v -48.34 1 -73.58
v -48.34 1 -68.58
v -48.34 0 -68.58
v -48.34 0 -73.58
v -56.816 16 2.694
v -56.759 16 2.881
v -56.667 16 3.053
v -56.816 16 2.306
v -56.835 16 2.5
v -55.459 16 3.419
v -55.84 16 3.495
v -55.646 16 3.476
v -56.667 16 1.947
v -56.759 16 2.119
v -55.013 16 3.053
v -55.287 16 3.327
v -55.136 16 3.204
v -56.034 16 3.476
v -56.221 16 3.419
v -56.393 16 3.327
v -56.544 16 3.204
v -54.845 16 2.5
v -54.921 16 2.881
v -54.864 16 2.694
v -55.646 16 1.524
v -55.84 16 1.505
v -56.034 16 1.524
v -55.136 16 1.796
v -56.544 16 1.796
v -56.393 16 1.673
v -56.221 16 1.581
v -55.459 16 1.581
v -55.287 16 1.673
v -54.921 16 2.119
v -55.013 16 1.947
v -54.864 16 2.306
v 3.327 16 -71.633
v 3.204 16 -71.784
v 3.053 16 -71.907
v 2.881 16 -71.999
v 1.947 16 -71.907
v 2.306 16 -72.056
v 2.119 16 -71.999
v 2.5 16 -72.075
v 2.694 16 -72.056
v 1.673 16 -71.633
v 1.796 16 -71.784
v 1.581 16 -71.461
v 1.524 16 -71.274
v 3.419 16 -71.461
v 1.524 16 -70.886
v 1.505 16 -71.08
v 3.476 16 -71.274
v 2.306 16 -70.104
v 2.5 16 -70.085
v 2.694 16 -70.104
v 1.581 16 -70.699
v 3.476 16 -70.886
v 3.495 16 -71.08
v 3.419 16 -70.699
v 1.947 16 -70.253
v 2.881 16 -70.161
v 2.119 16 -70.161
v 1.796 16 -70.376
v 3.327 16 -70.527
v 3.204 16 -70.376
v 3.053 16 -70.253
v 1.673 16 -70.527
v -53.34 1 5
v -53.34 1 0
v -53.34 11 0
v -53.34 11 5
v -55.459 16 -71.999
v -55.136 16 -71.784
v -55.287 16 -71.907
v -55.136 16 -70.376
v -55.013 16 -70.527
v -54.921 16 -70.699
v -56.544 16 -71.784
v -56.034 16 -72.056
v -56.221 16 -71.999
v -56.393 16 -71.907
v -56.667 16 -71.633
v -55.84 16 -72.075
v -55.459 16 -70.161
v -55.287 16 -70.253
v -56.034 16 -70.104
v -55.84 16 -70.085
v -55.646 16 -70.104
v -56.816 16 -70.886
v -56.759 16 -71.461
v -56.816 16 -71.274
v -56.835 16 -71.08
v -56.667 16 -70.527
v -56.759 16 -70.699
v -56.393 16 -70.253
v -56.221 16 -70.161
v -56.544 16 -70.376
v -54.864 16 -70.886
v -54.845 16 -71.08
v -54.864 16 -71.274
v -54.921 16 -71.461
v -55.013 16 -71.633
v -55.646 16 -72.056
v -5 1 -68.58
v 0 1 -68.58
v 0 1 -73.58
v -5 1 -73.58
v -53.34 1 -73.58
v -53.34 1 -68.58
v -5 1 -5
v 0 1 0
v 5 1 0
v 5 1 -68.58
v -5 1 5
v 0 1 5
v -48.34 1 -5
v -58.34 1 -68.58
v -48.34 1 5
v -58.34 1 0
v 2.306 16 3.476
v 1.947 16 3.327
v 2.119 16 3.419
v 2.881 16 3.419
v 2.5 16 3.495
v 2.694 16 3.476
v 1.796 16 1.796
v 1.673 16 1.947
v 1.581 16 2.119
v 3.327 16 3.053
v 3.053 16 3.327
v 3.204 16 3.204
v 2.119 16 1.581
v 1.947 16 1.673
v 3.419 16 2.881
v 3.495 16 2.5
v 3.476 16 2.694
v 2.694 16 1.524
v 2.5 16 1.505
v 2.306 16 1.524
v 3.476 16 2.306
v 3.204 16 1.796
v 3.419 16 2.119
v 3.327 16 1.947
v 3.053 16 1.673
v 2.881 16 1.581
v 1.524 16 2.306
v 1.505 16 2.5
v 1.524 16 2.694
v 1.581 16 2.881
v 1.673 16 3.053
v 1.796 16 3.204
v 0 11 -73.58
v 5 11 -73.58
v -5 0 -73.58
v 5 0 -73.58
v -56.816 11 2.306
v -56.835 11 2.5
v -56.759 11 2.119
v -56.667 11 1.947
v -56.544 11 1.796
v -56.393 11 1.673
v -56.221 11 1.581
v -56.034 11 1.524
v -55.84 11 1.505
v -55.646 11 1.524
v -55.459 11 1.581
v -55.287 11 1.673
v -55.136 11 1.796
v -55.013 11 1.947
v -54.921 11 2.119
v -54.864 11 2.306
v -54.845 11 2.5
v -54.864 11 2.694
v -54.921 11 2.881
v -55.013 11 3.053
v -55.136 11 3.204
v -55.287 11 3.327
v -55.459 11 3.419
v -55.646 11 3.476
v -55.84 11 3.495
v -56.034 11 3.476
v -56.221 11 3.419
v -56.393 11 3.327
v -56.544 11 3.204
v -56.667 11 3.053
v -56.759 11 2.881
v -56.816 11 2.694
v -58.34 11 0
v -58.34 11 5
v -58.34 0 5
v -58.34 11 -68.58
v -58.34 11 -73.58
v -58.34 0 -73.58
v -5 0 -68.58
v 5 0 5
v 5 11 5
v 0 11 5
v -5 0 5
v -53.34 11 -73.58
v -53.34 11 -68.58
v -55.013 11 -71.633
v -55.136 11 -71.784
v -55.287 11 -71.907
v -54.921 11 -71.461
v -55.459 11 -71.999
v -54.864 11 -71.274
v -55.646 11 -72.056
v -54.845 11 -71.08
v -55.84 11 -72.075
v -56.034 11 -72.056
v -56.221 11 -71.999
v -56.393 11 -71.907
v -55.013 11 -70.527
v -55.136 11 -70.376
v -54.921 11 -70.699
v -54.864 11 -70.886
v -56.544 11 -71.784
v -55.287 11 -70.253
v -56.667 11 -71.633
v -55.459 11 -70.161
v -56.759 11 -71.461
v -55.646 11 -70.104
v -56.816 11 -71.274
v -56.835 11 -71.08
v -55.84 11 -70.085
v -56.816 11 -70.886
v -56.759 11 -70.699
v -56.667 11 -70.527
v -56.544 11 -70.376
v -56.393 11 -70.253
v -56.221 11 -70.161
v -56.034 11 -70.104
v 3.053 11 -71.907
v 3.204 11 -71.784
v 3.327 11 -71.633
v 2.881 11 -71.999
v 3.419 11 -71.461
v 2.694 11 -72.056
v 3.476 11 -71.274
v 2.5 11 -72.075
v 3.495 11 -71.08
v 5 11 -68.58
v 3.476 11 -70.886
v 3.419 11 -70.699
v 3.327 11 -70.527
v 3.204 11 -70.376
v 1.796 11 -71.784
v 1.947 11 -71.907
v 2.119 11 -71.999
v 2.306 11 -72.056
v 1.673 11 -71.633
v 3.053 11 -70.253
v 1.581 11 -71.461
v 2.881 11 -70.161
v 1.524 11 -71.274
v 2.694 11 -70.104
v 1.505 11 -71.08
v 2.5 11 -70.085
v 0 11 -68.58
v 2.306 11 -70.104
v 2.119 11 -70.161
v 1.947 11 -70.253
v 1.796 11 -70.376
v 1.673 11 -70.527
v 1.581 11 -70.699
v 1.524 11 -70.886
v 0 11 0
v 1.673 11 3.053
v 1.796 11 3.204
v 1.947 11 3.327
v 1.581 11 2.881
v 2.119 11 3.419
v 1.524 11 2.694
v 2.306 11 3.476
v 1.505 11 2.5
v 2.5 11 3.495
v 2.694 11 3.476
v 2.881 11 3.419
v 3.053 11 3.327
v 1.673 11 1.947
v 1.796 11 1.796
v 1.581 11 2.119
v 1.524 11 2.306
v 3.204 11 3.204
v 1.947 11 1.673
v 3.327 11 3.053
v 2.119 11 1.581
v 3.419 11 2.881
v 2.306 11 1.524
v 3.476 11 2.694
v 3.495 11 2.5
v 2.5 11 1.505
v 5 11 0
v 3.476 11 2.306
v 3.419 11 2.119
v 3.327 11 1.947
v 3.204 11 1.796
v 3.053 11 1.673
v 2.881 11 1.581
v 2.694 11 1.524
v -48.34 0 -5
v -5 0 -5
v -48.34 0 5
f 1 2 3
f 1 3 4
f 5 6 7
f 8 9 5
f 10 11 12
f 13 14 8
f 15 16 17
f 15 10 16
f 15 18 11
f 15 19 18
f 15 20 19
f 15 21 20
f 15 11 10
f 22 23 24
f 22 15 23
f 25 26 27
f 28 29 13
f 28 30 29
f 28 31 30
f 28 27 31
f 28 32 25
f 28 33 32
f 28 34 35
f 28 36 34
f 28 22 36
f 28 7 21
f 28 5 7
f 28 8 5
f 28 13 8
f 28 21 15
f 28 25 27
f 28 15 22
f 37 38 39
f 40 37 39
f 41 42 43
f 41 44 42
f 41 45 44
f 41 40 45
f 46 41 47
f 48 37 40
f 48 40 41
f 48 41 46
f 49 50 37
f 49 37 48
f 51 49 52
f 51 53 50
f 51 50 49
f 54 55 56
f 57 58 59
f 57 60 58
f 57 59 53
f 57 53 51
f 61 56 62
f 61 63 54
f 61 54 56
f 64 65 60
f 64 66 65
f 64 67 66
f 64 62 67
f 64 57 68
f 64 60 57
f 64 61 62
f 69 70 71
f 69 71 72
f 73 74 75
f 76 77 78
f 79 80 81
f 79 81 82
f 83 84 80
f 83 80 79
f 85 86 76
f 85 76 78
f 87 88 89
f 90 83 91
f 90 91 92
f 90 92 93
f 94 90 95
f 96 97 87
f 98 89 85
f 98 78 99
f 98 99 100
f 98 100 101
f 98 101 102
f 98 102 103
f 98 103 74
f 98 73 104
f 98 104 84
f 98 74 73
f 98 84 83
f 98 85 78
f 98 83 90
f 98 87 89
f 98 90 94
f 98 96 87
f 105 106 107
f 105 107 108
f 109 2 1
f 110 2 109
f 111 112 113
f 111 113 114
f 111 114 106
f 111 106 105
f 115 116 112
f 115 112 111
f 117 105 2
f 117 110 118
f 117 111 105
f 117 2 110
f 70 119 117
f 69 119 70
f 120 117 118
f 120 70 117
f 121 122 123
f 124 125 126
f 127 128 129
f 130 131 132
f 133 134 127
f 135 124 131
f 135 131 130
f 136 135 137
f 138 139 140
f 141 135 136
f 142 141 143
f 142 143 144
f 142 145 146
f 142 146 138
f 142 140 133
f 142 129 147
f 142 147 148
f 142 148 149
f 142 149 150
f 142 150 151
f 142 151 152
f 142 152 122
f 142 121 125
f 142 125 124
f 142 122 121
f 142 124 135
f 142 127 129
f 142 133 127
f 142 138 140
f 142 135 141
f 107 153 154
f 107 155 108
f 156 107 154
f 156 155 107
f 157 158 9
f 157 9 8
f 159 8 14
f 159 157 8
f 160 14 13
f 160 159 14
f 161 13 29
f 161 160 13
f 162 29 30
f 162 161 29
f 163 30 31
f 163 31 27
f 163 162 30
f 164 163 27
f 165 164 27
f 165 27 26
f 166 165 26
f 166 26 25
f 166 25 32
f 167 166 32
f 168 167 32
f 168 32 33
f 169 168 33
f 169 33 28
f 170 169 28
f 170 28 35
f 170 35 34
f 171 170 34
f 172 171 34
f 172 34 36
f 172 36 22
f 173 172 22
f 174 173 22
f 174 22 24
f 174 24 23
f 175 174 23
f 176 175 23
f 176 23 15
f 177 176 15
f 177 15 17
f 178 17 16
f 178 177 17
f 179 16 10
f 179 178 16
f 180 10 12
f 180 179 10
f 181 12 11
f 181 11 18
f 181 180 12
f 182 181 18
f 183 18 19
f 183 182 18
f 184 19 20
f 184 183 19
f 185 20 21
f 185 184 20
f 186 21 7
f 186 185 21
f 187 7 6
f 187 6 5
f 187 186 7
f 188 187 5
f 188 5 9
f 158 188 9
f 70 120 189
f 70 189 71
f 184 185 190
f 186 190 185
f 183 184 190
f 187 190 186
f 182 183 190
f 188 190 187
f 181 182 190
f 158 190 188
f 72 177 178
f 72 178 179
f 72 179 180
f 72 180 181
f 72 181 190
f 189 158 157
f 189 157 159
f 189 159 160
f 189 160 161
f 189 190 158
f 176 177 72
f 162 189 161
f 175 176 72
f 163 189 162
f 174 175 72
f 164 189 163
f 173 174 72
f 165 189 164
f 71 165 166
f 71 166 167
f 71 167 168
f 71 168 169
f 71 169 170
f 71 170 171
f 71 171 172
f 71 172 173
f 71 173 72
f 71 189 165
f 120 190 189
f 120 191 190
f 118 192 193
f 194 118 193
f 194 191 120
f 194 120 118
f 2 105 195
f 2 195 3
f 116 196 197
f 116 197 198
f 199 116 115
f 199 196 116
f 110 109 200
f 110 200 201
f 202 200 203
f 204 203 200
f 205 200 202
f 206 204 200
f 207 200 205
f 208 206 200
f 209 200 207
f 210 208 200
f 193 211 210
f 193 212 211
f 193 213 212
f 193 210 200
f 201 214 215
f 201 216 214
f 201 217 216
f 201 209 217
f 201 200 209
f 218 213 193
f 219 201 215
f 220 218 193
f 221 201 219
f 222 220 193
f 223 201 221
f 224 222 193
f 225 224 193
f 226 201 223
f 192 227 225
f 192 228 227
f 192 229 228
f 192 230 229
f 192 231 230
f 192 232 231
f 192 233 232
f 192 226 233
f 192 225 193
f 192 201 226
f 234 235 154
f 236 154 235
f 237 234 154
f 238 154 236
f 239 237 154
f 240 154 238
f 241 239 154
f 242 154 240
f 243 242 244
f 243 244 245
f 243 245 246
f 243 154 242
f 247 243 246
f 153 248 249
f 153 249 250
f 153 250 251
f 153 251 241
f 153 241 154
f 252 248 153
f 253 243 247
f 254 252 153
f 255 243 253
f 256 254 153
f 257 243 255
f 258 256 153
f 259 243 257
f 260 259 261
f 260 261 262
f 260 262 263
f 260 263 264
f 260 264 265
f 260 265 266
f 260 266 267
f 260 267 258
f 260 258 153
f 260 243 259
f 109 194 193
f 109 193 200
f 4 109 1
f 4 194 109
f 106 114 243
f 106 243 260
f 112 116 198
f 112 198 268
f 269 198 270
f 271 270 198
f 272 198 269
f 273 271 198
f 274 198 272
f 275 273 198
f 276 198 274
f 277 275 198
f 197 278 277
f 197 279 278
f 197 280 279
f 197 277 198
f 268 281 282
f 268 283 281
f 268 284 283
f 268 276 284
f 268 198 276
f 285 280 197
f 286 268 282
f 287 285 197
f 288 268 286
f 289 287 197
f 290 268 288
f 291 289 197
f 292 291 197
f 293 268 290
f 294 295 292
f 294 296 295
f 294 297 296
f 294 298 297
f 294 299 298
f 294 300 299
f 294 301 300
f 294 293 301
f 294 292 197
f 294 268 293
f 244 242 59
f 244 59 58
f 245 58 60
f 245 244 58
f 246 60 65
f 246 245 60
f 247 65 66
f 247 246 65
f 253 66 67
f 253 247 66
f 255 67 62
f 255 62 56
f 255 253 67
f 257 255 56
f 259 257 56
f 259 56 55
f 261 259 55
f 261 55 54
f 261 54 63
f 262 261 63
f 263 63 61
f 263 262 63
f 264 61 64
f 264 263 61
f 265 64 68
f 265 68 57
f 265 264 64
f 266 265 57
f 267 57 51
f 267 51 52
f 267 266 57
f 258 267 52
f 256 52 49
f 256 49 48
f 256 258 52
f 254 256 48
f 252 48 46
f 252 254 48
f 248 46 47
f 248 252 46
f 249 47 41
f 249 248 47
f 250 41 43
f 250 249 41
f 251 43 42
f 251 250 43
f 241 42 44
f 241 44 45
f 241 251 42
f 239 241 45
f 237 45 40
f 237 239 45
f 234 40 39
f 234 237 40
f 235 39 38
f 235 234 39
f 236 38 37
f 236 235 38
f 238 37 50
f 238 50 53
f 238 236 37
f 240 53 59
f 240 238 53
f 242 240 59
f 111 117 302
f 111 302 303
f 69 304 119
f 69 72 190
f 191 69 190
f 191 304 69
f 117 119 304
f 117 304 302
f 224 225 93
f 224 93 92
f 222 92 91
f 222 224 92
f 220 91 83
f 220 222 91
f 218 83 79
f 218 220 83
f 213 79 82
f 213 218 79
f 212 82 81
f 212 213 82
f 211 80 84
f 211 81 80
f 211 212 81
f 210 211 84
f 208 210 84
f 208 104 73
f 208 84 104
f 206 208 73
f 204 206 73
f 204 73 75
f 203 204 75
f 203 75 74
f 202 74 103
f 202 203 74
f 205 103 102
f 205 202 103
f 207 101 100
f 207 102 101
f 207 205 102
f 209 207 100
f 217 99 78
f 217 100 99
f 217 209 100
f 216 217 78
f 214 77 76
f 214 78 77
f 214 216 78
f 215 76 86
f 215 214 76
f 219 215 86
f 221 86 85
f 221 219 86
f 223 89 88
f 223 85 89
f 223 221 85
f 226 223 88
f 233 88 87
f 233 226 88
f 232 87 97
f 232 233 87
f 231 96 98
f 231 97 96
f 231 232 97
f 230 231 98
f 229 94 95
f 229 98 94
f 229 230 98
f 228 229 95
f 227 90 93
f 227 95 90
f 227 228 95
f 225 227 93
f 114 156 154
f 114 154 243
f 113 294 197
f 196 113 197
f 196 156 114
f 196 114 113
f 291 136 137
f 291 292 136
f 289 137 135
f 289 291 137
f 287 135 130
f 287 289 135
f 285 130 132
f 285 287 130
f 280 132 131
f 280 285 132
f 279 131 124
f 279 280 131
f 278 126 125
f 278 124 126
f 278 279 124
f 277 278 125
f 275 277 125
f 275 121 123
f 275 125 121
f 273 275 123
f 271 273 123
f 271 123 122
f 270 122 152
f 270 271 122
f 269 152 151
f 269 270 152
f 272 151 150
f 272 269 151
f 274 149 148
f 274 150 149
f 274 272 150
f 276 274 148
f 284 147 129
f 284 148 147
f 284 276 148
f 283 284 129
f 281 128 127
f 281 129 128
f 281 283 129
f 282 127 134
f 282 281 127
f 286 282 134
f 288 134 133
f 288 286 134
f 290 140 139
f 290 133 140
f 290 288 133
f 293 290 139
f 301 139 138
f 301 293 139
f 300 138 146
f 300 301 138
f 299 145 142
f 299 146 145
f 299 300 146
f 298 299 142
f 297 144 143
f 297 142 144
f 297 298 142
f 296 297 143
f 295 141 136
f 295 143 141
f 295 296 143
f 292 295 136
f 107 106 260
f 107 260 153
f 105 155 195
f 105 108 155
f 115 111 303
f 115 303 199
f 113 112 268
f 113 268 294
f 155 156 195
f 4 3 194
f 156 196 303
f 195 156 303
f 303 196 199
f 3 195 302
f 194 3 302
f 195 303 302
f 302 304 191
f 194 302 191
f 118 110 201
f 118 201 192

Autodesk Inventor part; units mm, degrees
ref_plane "YZ Plane" through (0, 0, 0) normal (1, 0, 0) x (0, 1, 0)
ref_plane "XZ Plane" through (0, 0, 0) normal (0, 1, 0) x (-1, 0, 0)
ref_plane "XY Plane" through (0, 0, 0) normal (0, 0, 1) x (1, 0, 0)
sketch "Sketch1" plane through (0, 0, 0) normal (0, 1, 0) x (-1, 0, 0)
  line L0 (0, 0) -> (53.34, 0)
  line L1 (53.34, 0) -> (53.34, -68.58)
  line L2 (53.34, -68.58) -> (0, -68.58)
  line L3 (0, -68.58) -> (0, 0)
  line L4 (53.34, -66) -> (0, -66) construction
  circle A0 centre (7.62, -66) radius 1.5
  circle A1 centre (35.56, -66) radius 1.5
  circle A2 centre (2.5, -14) radius 1.5
  line L5 (-5, -73.58) -> (58.34, -73.58)
  line L6 (58.34, -73.58) -> (58.34, 5)
  line L7 (58.34, 5) -> (-5, 5)
  line L8 (-5, 5) -> (-5, -73.58)
  dimension "d0" = 68.58
  dimension "d1" = 53.34
  dimension "d2" = 2.58
  dimension "d3" = 3
  dimension "d4" = 7.62
  dimension "d5" = 3
  dimension "d6" = 35.56
  dimension "d8" = 3
  dimension "d9" = 14
  dimension "d10" = 2.5
  dimension "d46" = 5
extrude "Extrusion4" add sketch "Sketch1" along normal blind 1 contours L0 L1 L2 L3 | A0 | A1 | A2 | L8 L7 L6 L5
sketch "Sketch5" plane through (0, 1, 0) normal (0, 1, 0) x (1, 0, 0)
  line L0 (5, -5) -> (0, -5)
  line L1 (0, -5) -> (0, 0)
  line L2 (0, 0) -> (5, 0)
  line L3 (5, 0) -> (5, -5)
  dimension "d49" = 5
  dimension "d50" = 5
extrude "Extrusion5" add sketch "Sketch5" along normal blind 10
ref_plane "Work Plane2" through (-26.67, 0, 5) normal (1, 0, 0) x (0, 0, -1)
mirror "Mirror2" about plane through (-26.67, 0, 5) normal (1, 0, 0) of "Extrusion5"
ref_plane "Work Plane3" through (-58.34, 0, -34.29) normal (0, 0, 1) x (1, 0, 0)
mirror "Mirror3" about plane through (-58.34, 0, -34.29) normal (0, 0, 1) of "Extrusion5", "Mirror2"
sketch "Sketch7" plane through (0, 11, 0) normal (0, 1, 0) x (1, 0, 0)
  line L0 (0, 0) -> (0, -5) projected
  line L1 (0, -5) -> (5, -5) projected
  line L2 (5, -5) -> (5, 0) projected
  line L3 (5, 0) -> (0, 0) projected
  circle A0 centre (2.5, -2.5) radius 0.995
  dimension "d53" = 5
  dimension "d54" = 1.99
extrude "Extrusion8" add sketch "Sketch7" along normal blind 5 contours A0
mirror "Mirror10" about plane through (-26.67, 0, 5) normal (1, 0, 0) of "Extrusion8"
mirror "Mirror11" about plane through (-58.34, 0, -34.29) normal (0, 0, 1) of "Extrusion8", "Mirror10"
sketch "Sketch8" plane through (0, 1, 0) normal (0, 1, 0) x (1, 0, 0)
  line L0 (-53.34, 73.58) -> (-53.34, 68.58) projected
  line L1 (-53.34, 68.58) -> (-58.34, 68.58) projected
  line L2 (-58.34, 68.58) -> (-58.34, 0) projected
  line L3 (-58.34, 0) -> (-53.34, 0) projected
  line L4 (-53.34, 0) -> (-53.34, -5) projected
  line L5 (-53.34, -5) -> (0, -5) projected
  line L6 (0, -5) -> (0, 0) projected
  line L7 (0, 0) -> (5, 0) projected
  line L8 (5, 0) -> (5, 68.58) projected
  line L9 (5, 68.58) -> (0, 68.58) projected
  line L10 (0, 68.58) -> (0, 73.58) projected
  line L11 (0, 73.58) -> (-53.34, 73.58) projected
  line L12 (-58.34, -5) -> (5, -5) projected
  line L13 (-48.34, 5) -> (-5, 5)
  line L14 (-5, 5) -> (-5, -5)
  line L15 (-5, -5) -> (-48.34, -5)
  line L16 (-48.34, -5) -> (-48.34, 5)
  line L17 (5, -5) -> (5, 73.58) projected
  line L18 (5, 73.58) -> (-58.34, 73.58) projected
  line L19 (-48.34, 73.58) -> (-5, 73.58)
  line L20 (-5, 73.58) -> (-5, 68.58)
  line L21 (-5, 68.58) -> (-48.34, 68.58)
  line L22 (-48.34, 68.58) -> (-48.34, 73.58)
  dimension "d64" = 53.34
  dimension "d65" = 43.34
  dimension "d66" = 5
  dimension "d69" = 78.58
  dimension "d72" = 10
  dimension "d73" = 5
  dimension "d74" = 5
extrude "Extrusion9" cut sketch "Sketch8" against normal blind 1 contours L11 L20 L21 L22 | L16 L13 L14 L5
properties part number "boardtable2"
